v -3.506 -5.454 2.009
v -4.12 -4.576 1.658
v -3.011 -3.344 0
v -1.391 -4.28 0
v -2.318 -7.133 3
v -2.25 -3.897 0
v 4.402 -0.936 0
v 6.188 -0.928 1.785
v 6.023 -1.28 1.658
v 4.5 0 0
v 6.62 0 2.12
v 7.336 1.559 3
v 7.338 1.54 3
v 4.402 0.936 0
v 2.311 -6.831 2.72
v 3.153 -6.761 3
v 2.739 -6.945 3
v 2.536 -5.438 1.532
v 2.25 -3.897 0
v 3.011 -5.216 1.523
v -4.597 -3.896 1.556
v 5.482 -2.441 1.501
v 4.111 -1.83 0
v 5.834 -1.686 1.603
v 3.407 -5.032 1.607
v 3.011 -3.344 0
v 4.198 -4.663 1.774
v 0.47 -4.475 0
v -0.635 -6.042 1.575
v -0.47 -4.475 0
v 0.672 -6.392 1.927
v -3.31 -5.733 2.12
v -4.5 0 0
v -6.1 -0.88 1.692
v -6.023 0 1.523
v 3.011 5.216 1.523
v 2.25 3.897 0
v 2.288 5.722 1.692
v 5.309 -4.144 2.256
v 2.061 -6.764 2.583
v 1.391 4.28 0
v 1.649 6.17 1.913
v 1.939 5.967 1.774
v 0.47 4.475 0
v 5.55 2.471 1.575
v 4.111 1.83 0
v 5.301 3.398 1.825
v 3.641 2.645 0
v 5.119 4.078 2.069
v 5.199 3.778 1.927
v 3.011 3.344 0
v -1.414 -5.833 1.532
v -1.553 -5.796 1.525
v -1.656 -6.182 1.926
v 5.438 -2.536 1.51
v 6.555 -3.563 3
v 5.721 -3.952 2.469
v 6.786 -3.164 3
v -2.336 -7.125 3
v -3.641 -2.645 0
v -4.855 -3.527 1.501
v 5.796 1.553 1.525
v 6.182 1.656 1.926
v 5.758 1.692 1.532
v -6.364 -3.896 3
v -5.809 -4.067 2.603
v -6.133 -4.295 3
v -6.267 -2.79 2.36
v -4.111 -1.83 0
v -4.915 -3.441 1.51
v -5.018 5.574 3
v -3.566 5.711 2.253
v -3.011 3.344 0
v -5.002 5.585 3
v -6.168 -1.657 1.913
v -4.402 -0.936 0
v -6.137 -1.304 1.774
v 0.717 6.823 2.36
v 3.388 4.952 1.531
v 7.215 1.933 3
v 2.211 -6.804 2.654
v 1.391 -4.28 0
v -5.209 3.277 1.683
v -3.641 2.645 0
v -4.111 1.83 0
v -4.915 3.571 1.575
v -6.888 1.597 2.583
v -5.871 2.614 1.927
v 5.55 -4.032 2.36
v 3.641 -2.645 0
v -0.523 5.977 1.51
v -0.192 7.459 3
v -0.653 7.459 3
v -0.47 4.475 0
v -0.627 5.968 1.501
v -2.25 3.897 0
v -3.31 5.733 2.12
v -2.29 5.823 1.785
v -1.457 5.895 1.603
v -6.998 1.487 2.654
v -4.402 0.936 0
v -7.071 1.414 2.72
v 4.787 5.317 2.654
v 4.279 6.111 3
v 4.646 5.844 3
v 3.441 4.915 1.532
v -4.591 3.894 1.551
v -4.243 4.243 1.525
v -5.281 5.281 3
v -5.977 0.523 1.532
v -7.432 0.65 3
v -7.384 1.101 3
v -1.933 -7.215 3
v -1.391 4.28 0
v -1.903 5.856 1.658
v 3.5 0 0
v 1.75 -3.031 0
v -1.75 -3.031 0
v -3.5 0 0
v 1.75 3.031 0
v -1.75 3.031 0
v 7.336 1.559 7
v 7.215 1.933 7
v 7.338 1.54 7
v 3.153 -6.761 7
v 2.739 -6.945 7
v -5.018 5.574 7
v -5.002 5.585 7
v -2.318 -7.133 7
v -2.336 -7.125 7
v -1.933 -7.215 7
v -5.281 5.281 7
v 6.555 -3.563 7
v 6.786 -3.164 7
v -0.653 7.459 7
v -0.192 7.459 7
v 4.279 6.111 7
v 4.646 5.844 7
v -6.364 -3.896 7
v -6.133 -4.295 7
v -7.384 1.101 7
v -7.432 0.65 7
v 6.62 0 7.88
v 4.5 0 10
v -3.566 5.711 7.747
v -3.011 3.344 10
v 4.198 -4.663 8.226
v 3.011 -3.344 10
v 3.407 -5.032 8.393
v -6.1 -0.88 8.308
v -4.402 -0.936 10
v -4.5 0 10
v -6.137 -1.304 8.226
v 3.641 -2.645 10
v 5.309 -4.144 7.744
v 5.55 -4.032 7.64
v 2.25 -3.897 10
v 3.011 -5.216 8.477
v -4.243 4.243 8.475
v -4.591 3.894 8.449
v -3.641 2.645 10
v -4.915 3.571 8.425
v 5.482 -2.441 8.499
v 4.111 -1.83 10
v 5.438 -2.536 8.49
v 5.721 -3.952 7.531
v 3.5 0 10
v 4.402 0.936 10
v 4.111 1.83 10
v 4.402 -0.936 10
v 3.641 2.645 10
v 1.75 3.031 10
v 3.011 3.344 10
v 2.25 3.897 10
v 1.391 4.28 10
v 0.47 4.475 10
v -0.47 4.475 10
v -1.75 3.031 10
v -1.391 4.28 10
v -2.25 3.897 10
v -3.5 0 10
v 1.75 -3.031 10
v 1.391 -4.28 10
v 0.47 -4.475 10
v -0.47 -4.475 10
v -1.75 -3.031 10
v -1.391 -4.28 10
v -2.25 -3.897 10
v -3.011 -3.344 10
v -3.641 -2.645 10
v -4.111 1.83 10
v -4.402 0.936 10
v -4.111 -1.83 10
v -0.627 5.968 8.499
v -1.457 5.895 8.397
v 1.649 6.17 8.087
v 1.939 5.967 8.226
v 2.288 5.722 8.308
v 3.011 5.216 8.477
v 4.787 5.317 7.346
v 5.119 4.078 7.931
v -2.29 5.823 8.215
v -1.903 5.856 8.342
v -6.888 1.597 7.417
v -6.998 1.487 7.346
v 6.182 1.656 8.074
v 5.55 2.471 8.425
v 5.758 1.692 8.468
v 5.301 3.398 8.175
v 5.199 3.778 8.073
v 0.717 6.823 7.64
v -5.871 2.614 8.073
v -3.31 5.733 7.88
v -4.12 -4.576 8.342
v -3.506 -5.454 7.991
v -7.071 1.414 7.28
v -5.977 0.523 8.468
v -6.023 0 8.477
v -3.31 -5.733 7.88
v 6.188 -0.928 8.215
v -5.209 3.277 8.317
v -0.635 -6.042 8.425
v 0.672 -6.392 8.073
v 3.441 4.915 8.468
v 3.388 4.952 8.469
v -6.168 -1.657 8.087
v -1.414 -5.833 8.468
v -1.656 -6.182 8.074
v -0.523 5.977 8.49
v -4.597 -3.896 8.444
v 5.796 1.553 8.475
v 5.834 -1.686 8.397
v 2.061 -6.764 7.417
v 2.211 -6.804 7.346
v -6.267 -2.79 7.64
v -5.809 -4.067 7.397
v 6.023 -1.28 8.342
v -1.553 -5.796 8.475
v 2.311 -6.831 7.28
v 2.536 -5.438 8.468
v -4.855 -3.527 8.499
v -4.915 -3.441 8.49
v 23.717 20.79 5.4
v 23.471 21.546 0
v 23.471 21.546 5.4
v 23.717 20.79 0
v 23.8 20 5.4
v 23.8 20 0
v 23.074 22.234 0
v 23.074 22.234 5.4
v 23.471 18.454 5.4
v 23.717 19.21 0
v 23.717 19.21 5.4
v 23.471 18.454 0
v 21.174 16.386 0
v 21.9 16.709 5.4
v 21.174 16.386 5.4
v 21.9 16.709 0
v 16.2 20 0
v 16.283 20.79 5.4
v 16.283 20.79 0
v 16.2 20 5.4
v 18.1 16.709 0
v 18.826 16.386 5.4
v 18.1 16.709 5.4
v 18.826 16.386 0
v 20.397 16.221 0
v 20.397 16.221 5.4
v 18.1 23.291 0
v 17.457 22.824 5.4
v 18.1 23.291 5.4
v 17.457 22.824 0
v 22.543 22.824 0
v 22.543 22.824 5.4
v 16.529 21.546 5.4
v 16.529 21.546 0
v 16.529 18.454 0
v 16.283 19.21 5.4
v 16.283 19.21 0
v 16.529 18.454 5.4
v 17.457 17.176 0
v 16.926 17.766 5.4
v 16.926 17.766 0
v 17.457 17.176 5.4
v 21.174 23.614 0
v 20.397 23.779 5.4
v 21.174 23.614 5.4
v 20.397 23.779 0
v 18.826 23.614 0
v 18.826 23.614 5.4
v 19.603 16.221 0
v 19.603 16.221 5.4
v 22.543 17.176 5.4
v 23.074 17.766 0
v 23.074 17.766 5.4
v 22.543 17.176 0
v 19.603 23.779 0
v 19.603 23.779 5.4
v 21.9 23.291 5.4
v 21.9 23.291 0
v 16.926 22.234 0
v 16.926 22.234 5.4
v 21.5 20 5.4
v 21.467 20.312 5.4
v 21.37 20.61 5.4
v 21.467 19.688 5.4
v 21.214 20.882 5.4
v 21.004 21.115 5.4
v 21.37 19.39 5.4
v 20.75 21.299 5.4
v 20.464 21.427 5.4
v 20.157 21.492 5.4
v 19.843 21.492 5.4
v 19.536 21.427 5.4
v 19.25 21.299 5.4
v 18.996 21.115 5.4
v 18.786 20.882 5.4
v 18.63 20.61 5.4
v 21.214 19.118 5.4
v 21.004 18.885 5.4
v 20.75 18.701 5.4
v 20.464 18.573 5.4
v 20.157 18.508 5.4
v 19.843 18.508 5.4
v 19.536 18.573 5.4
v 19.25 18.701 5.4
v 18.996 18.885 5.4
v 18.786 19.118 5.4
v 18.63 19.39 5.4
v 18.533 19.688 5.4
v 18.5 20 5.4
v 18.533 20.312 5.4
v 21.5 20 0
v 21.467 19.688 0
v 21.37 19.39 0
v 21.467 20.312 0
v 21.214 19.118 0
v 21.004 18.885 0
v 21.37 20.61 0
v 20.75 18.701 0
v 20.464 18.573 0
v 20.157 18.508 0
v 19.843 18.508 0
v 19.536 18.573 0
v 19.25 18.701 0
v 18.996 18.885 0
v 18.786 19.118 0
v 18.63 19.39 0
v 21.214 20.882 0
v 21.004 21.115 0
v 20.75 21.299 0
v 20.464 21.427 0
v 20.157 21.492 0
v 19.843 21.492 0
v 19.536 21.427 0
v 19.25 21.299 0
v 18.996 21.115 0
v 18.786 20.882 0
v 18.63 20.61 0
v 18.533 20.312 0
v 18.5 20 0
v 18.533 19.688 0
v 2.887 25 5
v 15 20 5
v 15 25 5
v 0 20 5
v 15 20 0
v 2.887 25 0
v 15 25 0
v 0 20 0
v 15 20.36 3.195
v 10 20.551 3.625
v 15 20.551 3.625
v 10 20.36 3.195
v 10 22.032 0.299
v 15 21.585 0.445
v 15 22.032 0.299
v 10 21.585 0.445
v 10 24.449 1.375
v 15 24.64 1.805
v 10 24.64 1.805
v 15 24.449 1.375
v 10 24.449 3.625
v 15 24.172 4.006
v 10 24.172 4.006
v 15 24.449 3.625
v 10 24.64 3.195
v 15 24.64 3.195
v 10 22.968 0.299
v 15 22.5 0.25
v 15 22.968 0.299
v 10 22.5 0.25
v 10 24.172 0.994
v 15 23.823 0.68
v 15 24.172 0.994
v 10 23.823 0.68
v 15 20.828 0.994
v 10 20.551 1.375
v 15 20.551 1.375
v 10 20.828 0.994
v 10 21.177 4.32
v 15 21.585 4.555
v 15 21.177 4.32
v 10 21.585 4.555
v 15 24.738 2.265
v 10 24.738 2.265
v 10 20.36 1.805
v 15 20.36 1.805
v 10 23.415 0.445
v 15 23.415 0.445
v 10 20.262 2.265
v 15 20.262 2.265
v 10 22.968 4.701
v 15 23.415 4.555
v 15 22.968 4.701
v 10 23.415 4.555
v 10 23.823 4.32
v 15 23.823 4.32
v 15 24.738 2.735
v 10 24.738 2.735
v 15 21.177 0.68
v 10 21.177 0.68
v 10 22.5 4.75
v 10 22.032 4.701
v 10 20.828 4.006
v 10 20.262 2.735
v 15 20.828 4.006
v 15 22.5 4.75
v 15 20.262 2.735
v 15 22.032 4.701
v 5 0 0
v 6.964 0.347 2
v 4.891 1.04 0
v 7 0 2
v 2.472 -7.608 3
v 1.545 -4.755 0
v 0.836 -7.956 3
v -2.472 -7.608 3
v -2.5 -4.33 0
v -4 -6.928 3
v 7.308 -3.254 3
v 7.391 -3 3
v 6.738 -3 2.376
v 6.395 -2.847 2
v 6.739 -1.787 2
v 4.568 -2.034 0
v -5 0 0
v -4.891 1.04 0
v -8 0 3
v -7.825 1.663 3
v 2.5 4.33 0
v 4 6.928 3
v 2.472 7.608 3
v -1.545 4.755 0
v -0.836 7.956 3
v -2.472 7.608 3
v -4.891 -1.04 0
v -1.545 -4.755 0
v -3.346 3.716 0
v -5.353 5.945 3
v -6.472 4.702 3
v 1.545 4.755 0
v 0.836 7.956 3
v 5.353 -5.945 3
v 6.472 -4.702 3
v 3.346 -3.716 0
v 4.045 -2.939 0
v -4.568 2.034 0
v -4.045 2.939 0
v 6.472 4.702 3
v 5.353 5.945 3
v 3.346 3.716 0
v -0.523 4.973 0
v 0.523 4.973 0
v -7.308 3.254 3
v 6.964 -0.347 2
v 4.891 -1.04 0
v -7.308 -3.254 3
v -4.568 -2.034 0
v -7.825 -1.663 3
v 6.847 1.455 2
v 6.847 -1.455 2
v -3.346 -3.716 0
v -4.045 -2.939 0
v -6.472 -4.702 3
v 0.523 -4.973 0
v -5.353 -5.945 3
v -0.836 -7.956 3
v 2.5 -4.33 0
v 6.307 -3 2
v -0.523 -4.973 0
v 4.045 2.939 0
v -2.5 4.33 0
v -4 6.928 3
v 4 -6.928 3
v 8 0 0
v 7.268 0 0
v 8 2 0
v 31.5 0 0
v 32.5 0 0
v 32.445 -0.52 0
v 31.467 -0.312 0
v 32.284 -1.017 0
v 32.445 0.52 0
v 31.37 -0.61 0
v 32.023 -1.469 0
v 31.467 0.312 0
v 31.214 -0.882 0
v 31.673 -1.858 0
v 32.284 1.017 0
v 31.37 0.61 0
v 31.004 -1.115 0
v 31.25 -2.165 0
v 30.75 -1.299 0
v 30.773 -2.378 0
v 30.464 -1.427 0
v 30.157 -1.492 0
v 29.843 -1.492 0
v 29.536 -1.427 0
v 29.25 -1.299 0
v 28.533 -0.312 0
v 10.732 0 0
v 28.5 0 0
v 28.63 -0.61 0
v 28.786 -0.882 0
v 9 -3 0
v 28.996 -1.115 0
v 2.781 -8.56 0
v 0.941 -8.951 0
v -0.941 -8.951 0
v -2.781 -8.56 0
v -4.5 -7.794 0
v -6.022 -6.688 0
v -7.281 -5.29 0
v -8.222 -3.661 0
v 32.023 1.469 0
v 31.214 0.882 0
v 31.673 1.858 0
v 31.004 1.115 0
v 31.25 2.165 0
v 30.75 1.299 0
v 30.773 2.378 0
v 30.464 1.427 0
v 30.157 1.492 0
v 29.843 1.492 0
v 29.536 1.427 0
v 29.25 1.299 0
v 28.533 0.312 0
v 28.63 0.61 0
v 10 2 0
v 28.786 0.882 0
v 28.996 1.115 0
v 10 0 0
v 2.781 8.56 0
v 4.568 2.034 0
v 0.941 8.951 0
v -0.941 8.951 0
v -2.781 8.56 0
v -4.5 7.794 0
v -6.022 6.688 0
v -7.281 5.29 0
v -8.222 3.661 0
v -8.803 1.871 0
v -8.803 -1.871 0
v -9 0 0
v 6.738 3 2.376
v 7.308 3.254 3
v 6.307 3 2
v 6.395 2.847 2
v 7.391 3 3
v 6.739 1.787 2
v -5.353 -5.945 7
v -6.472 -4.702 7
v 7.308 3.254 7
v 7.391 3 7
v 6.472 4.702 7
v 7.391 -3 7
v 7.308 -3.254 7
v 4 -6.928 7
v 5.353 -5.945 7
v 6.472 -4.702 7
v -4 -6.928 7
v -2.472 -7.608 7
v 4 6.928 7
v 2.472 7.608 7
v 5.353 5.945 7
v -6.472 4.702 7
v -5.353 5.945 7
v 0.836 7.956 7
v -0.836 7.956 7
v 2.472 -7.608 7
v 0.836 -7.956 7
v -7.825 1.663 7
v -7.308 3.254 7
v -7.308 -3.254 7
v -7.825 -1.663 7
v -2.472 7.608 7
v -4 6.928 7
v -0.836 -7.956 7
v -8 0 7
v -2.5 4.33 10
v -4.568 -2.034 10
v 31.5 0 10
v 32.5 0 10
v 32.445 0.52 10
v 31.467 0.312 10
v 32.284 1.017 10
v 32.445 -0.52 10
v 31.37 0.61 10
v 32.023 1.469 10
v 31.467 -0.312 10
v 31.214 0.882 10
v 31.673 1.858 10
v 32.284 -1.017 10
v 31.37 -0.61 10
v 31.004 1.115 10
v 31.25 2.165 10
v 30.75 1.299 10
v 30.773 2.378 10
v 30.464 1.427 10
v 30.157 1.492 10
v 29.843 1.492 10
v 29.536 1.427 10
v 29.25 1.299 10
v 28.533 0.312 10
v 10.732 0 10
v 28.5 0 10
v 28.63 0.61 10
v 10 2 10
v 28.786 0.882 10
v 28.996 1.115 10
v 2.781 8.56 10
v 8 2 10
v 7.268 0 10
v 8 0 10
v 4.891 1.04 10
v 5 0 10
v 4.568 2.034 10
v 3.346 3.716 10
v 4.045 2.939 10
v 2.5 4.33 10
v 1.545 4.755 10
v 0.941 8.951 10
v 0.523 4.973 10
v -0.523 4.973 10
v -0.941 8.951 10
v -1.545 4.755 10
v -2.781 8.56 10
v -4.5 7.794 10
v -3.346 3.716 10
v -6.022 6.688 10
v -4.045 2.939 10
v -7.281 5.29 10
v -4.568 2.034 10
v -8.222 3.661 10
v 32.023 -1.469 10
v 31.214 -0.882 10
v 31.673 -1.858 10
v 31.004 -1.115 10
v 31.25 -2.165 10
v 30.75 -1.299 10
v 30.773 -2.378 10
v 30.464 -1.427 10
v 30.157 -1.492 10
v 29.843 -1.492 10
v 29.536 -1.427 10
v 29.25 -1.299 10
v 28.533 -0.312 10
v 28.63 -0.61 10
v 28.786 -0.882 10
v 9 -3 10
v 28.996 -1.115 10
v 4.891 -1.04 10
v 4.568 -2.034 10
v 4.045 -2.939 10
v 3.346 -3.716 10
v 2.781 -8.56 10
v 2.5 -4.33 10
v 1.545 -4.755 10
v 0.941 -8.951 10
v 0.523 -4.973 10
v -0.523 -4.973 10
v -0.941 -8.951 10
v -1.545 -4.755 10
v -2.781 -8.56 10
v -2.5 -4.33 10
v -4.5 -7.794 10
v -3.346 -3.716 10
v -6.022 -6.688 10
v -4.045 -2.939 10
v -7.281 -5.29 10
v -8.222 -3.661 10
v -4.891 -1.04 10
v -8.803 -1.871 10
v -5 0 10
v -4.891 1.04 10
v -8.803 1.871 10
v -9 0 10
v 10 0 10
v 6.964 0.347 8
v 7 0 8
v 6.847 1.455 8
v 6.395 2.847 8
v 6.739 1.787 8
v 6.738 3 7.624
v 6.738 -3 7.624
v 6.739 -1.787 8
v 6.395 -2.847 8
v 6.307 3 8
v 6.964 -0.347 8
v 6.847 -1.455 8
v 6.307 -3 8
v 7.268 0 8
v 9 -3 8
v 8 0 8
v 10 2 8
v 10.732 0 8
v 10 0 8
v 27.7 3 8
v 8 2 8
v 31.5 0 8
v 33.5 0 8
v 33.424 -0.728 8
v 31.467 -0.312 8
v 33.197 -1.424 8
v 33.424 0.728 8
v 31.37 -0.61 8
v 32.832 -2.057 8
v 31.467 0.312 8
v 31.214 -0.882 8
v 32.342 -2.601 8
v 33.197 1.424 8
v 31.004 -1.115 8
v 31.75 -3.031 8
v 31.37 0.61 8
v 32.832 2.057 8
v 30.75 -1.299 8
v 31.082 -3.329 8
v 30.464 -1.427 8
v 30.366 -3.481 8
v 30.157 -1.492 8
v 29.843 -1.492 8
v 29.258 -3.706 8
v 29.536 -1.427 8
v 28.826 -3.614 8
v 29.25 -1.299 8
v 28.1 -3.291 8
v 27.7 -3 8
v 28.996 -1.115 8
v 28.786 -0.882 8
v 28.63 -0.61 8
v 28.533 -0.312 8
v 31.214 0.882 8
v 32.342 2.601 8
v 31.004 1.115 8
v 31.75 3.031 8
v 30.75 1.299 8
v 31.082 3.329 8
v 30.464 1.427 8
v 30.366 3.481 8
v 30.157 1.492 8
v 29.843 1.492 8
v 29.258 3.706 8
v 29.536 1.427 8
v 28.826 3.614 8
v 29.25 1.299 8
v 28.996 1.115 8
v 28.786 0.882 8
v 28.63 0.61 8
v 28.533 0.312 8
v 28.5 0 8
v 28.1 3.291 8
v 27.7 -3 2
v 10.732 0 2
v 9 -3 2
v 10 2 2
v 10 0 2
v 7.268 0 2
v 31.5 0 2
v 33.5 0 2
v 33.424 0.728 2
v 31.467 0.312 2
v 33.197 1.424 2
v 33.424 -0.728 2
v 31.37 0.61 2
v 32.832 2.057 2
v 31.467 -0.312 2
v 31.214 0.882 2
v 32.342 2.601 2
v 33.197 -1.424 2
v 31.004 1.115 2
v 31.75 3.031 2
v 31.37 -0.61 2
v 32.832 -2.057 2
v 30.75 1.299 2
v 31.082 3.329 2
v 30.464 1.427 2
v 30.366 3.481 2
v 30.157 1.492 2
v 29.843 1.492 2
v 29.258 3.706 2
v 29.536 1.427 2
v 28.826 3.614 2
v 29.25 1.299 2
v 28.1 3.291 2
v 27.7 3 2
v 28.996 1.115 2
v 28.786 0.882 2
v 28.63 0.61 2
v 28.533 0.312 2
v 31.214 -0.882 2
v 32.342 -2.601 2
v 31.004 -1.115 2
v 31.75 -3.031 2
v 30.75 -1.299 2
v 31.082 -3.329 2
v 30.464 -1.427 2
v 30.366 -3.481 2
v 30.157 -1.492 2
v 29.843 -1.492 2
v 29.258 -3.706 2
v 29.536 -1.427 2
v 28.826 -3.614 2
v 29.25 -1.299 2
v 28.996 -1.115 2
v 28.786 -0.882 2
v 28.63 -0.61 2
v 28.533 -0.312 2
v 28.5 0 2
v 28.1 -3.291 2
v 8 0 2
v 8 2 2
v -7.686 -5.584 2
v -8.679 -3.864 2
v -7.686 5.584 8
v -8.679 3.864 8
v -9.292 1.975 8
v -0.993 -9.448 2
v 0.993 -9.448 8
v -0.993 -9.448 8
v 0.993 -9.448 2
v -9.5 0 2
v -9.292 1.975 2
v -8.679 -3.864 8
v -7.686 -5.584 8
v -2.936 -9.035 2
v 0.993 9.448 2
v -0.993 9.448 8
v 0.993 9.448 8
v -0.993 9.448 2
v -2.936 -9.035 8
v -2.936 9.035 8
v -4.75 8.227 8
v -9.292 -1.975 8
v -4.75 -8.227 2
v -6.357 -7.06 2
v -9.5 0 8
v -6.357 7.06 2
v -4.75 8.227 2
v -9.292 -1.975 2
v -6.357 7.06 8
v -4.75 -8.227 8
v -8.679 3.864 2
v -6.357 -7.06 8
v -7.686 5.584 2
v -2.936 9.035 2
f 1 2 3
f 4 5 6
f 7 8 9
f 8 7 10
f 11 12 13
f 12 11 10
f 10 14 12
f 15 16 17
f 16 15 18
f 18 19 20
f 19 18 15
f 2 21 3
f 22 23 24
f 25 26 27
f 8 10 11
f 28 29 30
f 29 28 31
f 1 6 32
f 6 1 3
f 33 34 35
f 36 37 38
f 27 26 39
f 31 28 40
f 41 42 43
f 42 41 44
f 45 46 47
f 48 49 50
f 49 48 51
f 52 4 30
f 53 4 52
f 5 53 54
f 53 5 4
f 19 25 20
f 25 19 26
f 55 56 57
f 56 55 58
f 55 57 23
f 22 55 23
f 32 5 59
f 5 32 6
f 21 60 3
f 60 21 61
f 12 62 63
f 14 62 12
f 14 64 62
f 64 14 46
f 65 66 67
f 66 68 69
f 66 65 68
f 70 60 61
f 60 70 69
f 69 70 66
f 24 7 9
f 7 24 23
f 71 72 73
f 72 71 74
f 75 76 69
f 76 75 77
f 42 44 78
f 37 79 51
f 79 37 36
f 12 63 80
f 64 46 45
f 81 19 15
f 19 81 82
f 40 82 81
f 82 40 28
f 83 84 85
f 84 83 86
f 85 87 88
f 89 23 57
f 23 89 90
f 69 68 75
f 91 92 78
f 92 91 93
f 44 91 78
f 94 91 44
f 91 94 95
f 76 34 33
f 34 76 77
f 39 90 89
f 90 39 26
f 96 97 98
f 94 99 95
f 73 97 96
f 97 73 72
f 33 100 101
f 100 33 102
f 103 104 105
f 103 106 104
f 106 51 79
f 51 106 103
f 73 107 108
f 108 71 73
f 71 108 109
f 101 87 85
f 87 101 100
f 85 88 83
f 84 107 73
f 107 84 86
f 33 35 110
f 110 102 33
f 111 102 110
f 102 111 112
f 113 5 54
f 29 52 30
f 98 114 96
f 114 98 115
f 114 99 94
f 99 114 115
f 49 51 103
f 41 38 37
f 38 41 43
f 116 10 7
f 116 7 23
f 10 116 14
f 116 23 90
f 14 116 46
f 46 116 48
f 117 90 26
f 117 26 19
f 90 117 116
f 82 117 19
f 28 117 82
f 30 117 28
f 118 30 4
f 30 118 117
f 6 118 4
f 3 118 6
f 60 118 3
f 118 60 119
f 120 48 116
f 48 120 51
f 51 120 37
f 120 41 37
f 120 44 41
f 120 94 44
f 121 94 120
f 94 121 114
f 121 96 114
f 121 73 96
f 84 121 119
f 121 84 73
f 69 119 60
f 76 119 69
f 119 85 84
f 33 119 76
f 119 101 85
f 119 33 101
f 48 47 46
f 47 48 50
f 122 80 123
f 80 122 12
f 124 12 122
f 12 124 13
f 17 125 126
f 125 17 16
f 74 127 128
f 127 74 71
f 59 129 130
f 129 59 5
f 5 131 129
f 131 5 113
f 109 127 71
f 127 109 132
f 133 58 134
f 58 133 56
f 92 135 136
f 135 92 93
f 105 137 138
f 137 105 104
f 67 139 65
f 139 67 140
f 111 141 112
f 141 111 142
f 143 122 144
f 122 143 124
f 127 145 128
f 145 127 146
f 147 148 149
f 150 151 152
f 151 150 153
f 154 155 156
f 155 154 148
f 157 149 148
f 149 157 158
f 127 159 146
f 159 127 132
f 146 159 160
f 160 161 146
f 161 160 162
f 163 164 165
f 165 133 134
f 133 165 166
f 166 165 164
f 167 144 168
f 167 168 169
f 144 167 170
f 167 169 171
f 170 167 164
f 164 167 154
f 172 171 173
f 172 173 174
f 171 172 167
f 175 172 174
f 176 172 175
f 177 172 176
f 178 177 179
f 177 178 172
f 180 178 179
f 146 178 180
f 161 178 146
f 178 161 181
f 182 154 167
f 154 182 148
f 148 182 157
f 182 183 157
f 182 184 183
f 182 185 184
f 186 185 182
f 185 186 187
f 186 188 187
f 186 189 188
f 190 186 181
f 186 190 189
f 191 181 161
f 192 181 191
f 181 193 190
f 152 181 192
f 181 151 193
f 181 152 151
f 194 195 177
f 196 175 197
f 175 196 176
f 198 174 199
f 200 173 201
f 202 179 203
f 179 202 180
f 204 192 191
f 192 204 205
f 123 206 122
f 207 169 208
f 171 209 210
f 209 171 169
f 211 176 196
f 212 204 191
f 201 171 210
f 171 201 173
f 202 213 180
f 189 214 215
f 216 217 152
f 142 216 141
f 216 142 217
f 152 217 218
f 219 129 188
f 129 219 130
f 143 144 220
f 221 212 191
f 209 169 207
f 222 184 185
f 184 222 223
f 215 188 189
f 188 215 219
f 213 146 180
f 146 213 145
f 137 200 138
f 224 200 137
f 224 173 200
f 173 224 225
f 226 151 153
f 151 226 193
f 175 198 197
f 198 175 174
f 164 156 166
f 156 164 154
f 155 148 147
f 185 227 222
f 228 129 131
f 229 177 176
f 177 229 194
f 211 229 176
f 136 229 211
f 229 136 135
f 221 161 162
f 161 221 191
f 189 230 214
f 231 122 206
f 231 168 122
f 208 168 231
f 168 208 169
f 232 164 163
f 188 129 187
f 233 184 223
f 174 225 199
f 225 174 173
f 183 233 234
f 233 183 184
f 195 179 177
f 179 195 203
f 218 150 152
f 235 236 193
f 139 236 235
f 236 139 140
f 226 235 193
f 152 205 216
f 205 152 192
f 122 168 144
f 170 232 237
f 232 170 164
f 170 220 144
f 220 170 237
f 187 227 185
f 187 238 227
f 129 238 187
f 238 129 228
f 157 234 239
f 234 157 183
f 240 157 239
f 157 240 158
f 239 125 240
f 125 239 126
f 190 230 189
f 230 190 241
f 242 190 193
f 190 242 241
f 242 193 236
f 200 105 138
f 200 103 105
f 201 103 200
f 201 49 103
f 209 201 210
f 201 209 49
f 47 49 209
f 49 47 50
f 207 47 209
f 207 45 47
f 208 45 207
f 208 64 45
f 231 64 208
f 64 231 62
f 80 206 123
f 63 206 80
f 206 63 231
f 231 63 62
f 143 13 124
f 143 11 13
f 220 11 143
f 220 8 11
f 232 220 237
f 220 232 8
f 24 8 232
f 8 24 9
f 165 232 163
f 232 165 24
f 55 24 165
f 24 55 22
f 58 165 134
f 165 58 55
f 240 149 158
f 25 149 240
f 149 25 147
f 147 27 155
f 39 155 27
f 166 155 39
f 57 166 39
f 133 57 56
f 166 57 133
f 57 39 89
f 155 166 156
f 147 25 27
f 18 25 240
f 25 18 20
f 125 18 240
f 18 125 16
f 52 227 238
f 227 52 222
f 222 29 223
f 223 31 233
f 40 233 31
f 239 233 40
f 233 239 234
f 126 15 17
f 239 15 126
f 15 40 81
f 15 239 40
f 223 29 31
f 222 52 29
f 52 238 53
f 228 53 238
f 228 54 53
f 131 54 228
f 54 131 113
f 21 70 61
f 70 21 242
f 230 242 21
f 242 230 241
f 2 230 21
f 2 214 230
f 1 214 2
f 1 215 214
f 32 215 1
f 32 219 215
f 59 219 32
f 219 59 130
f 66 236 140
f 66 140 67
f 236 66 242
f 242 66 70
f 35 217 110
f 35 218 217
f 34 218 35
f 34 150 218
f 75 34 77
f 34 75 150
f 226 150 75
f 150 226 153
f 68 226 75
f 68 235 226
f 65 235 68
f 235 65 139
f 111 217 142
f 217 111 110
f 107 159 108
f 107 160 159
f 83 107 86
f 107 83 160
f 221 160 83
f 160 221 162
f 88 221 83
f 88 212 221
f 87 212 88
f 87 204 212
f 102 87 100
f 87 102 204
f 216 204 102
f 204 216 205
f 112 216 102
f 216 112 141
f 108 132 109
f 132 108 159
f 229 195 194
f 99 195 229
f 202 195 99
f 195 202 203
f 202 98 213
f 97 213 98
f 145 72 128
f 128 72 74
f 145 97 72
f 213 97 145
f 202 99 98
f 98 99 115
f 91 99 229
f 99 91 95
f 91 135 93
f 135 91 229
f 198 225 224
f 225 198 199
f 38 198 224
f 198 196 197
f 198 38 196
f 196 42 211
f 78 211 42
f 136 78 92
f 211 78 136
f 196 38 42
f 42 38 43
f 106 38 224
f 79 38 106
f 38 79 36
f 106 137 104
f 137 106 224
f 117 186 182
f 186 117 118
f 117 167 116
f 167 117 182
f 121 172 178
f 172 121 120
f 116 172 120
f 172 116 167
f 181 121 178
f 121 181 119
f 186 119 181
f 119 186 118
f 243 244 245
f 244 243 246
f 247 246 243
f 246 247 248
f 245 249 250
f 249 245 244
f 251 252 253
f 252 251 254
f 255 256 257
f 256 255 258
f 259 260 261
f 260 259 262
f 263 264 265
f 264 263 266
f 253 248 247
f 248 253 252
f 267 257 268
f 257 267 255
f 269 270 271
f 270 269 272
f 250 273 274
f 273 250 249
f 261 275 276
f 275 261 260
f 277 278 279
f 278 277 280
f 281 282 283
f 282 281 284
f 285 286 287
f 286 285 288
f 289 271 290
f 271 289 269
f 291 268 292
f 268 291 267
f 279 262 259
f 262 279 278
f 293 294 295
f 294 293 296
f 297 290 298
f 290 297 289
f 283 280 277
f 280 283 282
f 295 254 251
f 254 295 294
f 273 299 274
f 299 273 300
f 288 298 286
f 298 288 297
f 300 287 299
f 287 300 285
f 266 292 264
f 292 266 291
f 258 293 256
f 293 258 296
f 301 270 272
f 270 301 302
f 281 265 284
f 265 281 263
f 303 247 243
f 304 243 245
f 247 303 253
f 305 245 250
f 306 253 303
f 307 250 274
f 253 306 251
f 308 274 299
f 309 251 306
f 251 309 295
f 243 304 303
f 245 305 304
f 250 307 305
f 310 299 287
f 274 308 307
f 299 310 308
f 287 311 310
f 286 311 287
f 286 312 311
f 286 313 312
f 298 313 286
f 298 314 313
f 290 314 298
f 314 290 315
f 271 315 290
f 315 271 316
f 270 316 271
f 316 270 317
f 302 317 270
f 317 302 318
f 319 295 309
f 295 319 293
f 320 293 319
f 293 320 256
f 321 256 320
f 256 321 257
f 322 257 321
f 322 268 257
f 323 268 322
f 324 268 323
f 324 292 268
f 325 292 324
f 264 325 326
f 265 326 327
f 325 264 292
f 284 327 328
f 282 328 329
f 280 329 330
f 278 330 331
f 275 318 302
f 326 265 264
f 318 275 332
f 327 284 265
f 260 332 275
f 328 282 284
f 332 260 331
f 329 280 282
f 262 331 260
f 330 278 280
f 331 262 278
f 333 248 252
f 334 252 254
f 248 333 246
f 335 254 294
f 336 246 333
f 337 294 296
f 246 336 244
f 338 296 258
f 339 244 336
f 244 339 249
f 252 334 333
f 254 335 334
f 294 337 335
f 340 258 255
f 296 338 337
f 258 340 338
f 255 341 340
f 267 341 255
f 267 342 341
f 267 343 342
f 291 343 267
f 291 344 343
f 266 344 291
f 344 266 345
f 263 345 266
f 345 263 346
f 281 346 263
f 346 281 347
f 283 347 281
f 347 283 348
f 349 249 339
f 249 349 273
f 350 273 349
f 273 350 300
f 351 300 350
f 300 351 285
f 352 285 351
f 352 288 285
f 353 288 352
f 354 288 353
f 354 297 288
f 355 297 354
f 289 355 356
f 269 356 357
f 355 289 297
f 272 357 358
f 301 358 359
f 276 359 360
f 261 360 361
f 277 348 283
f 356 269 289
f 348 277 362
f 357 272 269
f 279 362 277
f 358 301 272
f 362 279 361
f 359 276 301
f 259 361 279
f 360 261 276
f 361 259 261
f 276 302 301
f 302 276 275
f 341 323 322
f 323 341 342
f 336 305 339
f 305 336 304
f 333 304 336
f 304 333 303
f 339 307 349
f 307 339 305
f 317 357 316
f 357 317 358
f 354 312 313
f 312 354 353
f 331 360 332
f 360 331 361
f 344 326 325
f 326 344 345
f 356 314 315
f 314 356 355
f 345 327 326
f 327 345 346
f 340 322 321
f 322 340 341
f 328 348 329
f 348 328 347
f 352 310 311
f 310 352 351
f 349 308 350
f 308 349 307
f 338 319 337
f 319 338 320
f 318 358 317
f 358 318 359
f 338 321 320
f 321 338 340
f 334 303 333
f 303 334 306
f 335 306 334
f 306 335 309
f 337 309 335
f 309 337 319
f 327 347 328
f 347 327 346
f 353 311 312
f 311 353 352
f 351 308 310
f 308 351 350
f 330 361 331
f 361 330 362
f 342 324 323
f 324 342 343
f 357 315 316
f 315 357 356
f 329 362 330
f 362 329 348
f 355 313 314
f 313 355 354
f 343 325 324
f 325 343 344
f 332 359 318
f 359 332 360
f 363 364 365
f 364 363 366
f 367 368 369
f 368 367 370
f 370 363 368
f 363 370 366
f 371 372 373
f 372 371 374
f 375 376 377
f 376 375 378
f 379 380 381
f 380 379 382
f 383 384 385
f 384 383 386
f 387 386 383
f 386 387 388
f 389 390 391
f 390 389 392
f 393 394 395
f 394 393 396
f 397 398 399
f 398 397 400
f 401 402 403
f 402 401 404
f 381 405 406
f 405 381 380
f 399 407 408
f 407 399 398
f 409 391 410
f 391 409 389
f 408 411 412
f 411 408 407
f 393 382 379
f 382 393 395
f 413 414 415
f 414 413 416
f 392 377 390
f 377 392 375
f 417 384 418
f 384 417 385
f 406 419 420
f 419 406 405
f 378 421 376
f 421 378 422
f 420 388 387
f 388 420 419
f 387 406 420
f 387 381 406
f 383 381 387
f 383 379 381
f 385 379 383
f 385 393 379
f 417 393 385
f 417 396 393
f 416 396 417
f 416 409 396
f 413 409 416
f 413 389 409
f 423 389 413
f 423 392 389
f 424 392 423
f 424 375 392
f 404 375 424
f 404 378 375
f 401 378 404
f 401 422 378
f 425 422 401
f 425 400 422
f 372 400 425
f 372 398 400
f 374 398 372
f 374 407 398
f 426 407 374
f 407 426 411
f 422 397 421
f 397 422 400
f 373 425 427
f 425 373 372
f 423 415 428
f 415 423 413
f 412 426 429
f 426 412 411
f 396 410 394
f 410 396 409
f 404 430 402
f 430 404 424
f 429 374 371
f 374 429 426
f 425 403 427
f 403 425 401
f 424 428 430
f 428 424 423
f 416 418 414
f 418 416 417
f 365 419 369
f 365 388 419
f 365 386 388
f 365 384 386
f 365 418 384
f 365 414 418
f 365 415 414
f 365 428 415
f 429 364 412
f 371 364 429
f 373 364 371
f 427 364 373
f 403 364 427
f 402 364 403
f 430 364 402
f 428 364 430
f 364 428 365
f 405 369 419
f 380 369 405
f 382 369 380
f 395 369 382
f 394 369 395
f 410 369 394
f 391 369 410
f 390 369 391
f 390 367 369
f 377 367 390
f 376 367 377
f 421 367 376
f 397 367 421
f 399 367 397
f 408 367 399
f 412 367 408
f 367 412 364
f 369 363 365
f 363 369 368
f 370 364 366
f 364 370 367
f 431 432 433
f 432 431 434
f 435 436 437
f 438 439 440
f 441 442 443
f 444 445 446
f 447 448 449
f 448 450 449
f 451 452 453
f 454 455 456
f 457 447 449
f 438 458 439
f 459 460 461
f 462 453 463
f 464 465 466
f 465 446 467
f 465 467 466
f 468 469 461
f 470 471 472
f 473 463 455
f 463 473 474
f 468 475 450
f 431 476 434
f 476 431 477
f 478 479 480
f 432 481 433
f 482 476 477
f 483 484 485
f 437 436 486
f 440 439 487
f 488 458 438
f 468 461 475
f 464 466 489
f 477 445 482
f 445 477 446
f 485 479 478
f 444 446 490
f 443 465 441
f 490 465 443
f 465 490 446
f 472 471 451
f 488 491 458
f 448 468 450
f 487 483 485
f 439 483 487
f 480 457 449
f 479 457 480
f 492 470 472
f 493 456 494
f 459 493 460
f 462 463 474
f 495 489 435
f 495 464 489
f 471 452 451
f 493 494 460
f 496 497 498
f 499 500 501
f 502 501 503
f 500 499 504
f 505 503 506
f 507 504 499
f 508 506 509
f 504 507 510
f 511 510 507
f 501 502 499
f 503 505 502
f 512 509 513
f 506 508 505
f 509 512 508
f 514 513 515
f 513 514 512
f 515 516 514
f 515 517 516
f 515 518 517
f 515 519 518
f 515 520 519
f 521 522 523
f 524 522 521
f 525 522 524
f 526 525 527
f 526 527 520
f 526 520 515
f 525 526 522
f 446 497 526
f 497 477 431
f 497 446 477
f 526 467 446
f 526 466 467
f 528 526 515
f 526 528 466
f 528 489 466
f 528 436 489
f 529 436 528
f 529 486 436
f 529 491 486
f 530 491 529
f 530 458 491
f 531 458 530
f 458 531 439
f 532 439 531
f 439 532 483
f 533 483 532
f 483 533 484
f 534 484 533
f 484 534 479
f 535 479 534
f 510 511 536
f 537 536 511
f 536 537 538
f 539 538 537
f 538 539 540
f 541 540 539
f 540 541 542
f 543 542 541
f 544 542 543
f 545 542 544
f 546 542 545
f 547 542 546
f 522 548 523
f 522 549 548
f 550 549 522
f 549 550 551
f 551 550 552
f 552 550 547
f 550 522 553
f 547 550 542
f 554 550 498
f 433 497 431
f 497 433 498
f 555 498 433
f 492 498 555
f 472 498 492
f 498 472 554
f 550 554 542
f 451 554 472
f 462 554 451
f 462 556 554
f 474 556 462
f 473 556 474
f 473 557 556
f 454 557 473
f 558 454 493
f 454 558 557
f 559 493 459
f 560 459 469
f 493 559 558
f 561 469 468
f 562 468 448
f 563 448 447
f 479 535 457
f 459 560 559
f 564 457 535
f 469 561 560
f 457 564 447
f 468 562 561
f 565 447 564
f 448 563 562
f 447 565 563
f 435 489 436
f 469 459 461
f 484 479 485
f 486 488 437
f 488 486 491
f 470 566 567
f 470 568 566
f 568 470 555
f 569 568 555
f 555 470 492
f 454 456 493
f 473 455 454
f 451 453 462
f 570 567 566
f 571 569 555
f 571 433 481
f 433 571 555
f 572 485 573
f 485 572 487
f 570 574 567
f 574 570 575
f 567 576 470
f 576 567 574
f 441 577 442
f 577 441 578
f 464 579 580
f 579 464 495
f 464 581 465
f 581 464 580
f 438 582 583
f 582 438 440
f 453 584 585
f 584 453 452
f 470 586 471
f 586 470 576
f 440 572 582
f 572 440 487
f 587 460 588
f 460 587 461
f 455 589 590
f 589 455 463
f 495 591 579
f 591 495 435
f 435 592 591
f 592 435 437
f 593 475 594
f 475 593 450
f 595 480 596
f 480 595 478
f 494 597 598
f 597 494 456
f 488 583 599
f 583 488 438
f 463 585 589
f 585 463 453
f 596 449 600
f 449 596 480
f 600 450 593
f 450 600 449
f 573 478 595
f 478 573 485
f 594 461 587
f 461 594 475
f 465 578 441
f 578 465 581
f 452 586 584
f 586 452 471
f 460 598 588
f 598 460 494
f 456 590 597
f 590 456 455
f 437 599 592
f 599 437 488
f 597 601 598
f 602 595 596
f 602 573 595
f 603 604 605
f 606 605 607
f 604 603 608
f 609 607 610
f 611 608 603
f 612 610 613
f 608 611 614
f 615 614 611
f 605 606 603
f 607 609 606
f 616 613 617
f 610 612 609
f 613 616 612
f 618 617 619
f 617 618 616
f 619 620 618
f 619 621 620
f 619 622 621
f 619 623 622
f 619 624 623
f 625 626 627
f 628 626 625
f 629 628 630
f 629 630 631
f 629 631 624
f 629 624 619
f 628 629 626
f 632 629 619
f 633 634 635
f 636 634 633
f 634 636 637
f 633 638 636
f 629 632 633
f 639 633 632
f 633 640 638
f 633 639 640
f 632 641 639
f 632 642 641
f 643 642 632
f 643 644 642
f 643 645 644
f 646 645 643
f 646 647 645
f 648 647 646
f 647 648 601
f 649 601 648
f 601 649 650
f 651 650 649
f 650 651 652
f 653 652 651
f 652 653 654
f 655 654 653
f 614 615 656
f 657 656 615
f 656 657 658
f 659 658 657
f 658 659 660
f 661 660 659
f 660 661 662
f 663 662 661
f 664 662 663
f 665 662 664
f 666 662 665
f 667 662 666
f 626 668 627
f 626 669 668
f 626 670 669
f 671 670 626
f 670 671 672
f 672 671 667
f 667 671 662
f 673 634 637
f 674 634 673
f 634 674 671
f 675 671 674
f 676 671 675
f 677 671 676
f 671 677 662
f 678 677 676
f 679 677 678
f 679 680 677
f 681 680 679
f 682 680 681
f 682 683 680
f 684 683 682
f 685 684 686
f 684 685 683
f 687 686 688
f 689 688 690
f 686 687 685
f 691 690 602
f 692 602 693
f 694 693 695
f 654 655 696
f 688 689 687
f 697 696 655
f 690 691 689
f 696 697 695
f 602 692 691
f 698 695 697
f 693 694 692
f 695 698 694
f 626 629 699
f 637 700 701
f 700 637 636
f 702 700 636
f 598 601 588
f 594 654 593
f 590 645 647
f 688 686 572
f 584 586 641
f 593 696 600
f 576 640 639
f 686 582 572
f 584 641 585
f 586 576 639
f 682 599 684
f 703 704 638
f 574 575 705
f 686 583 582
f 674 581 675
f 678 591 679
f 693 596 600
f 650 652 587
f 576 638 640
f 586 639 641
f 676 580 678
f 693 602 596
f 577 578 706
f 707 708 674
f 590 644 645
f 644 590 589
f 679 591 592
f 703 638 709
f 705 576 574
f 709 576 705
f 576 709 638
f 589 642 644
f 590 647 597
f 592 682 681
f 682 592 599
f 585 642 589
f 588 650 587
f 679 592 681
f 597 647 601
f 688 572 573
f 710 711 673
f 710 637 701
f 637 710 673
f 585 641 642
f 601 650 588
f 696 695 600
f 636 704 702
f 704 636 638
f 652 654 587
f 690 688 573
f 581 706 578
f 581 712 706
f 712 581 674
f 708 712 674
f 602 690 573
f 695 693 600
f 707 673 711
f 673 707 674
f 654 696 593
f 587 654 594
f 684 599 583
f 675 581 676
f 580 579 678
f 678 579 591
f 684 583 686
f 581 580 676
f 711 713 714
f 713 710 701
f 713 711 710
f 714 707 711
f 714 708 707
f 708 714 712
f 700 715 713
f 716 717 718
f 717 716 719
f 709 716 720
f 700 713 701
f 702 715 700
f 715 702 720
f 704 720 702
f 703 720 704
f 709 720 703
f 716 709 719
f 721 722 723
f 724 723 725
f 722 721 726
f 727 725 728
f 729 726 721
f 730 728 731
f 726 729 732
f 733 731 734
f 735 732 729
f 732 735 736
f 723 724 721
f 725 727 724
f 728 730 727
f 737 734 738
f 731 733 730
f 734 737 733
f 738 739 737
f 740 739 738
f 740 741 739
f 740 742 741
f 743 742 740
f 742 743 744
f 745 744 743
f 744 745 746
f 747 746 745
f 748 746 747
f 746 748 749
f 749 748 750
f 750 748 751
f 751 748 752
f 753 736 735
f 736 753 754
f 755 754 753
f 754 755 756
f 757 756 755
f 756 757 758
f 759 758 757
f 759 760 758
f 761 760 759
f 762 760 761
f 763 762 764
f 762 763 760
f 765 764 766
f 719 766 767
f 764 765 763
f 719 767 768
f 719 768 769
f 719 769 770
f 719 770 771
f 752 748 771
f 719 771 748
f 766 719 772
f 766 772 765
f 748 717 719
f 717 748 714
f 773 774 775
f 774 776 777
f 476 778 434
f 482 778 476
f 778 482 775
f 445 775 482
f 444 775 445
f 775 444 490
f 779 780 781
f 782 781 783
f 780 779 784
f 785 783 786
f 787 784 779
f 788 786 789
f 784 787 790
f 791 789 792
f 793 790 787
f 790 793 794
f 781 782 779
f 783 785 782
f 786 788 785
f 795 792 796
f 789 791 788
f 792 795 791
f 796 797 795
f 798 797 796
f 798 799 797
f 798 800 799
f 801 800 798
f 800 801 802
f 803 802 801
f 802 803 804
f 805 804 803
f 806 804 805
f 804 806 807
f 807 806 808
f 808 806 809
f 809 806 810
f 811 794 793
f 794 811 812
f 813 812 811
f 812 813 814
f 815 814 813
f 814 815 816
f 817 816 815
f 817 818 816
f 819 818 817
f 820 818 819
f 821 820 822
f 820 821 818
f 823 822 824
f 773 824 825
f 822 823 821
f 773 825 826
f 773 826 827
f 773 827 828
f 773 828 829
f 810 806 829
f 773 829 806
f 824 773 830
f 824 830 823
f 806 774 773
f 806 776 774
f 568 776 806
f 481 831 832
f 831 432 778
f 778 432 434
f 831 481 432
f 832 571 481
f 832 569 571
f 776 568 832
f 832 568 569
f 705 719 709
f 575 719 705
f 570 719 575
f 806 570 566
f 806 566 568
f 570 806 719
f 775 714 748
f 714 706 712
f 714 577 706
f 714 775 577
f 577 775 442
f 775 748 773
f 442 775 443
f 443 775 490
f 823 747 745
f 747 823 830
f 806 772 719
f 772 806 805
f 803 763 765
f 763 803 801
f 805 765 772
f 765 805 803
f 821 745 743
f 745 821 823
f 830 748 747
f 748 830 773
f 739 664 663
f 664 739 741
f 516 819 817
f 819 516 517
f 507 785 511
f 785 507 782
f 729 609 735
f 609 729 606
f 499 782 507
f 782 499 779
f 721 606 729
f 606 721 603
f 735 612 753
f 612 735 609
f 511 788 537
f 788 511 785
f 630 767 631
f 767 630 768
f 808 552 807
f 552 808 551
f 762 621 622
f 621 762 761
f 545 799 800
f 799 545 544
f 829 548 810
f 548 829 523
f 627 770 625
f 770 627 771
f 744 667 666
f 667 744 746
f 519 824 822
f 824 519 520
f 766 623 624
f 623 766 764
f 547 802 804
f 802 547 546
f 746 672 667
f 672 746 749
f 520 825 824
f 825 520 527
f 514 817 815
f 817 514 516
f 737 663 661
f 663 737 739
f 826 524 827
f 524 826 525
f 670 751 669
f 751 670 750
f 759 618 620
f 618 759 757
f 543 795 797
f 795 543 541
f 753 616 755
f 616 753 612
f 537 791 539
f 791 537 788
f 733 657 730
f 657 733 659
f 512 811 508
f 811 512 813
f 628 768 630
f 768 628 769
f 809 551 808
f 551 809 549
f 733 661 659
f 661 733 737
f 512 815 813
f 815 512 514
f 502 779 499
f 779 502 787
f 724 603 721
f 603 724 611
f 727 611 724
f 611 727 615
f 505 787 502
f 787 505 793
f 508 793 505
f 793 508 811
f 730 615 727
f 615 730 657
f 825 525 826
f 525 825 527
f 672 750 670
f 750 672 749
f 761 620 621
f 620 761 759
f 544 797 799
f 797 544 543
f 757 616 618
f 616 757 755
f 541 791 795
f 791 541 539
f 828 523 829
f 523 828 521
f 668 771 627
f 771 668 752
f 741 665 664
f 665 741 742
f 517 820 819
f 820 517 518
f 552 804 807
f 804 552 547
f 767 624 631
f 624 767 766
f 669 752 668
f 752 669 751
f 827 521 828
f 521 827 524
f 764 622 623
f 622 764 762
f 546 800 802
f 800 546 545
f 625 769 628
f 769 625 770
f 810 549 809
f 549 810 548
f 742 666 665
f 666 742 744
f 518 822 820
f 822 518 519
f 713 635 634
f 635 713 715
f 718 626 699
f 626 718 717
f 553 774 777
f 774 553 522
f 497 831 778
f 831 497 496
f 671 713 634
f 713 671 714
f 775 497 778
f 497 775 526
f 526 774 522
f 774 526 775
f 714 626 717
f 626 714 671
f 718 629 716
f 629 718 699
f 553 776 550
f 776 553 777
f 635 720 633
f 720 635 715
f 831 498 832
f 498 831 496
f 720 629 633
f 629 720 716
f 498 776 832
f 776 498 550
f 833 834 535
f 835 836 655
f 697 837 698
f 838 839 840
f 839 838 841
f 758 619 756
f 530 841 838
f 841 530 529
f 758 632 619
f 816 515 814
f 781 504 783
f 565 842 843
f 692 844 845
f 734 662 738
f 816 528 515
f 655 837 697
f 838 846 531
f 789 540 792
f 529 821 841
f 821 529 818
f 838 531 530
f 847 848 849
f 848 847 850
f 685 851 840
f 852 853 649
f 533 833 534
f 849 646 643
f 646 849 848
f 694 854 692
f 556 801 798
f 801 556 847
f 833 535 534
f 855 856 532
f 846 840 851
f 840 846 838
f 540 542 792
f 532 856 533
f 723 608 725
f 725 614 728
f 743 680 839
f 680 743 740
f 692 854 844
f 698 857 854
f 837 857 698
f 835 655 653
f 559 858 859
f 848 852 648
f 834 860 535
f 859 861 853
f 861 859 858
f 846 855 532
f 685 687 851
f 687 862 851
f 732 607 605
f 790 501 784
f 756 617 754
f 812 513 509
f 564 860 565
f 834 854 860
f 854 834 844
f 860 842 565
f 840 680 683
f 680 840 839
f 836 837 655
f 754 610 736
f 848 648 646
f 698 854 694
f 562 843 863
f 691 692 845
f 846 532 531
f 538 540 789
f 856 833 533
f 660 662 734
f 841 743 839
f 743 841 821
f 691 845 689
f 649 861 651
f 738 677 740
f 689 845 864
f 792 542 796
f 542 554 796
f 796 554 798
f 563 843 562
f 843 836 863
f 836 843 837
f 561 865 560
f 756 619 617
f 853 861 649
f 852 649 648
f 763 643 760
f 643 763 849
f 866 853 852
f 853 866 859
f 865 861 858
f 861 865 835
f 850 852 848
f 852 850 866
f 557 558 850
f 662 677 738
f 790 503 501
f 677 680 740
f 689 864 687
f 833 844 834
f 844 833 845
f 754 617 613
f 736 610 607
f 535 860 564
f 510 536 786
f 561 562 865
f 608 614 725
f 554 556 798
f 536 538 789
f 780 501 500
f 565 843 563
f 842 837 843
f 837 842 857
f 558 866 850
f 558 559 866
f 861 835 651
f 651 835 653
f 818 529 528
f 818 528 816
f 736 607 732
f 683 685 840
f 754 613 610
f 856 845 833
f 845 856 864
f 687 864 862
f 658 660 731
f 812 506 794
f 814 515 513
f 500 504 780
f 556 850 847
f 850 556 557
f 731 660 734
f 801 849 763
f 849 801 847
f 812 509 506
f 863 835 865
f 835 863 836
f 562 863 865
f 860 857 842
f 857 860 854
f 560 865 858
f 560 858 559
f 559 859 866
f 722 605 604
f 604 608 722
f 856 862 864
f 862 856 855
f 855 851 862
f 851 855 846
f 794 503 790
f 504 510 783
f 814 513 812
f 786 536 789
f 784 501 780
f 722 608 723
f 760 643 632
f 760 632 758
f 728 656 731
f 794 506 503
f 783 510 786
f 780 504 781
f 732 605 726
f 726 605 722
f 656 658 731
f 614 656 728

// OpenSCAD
module osa()
{
    difference()
    {
        union()
        {
            translate([0,0,0]) cylinder(d1=9,d2=15,h=3);
            translate([0,0,3]) cylinder(d=15,h=4);
            translate([0,0,7]) cylinder(d2=9,d1=15,h=3);
        }
        union()
        {
            translate([0,0,0]) cylinder(d=7,h=10,$fn=6);
            for(i=[0:40:360])
            {
                rotate([0,0,-i+15]) translate([6,0,0]) cube([6,6,10]);
            }
        }
    }
    
}

module telo()
{
    difference()
    {
        hull()
        {
            union()
            {
                translate([30,0,0]) cylinder(d1=5,d2=7,h=2);
                translate([30,0,2]) cylinder(d=7,h=6);
                translate([30,0,8]) cylinder(d2=5,d1=7,h=2);
             }
            union()
            {
                translate([0,0,0]) cylinder(d1=18,d2=19,h=2);
                translate([0,0,2]) cylinder(d=19,h=6);
                translate([0,0,8]) cylinder(d2=18,d1=19,h=2);
             }
        }
        union()
        {
            translate([0,0,0]) cylinder(d1=10,d2=16,h=3);
            translate([0,0,3]) cylinder(d=16,h=4);
            translate([0,0,7]) cylinder(d2=10,d1=16,h=3);
            translate([0,-3,2]) cube([50,6,6]);
            translate([30,0,2]) cylinder(d=7.6,h=6);
            translate([30,0,0]) cylinder(d=3,h=10);
            translate([9,-1,0]) rotate([0,0,30]) cylinder(d=4,h=10,$fn=3);
            translate([8,0,0]) cube([2,2,10]);
            
        }
    }
    
}    

module spunt()
{
    difference()
    {
        translate([20,20,0]) cylinder(d=7.6,h=5.4);
        translate([20,20,0]) cylinder(d=3,h=5.4);
    }
}

module jezdec()
{
    difference()
    {
        translate([0,20,0]) cube([15,5,5]);
        union()
        {
            translate([0,20,0]) rotate([0,0,60]) cube([6,6,5]);
            translate([10,22.5,2.5]) rotate([0,90,0]) cylinder(d=4.5,h=10);
        }
    }
}

$fn=30;
osa();
spunt();
jezdec();
telo();
